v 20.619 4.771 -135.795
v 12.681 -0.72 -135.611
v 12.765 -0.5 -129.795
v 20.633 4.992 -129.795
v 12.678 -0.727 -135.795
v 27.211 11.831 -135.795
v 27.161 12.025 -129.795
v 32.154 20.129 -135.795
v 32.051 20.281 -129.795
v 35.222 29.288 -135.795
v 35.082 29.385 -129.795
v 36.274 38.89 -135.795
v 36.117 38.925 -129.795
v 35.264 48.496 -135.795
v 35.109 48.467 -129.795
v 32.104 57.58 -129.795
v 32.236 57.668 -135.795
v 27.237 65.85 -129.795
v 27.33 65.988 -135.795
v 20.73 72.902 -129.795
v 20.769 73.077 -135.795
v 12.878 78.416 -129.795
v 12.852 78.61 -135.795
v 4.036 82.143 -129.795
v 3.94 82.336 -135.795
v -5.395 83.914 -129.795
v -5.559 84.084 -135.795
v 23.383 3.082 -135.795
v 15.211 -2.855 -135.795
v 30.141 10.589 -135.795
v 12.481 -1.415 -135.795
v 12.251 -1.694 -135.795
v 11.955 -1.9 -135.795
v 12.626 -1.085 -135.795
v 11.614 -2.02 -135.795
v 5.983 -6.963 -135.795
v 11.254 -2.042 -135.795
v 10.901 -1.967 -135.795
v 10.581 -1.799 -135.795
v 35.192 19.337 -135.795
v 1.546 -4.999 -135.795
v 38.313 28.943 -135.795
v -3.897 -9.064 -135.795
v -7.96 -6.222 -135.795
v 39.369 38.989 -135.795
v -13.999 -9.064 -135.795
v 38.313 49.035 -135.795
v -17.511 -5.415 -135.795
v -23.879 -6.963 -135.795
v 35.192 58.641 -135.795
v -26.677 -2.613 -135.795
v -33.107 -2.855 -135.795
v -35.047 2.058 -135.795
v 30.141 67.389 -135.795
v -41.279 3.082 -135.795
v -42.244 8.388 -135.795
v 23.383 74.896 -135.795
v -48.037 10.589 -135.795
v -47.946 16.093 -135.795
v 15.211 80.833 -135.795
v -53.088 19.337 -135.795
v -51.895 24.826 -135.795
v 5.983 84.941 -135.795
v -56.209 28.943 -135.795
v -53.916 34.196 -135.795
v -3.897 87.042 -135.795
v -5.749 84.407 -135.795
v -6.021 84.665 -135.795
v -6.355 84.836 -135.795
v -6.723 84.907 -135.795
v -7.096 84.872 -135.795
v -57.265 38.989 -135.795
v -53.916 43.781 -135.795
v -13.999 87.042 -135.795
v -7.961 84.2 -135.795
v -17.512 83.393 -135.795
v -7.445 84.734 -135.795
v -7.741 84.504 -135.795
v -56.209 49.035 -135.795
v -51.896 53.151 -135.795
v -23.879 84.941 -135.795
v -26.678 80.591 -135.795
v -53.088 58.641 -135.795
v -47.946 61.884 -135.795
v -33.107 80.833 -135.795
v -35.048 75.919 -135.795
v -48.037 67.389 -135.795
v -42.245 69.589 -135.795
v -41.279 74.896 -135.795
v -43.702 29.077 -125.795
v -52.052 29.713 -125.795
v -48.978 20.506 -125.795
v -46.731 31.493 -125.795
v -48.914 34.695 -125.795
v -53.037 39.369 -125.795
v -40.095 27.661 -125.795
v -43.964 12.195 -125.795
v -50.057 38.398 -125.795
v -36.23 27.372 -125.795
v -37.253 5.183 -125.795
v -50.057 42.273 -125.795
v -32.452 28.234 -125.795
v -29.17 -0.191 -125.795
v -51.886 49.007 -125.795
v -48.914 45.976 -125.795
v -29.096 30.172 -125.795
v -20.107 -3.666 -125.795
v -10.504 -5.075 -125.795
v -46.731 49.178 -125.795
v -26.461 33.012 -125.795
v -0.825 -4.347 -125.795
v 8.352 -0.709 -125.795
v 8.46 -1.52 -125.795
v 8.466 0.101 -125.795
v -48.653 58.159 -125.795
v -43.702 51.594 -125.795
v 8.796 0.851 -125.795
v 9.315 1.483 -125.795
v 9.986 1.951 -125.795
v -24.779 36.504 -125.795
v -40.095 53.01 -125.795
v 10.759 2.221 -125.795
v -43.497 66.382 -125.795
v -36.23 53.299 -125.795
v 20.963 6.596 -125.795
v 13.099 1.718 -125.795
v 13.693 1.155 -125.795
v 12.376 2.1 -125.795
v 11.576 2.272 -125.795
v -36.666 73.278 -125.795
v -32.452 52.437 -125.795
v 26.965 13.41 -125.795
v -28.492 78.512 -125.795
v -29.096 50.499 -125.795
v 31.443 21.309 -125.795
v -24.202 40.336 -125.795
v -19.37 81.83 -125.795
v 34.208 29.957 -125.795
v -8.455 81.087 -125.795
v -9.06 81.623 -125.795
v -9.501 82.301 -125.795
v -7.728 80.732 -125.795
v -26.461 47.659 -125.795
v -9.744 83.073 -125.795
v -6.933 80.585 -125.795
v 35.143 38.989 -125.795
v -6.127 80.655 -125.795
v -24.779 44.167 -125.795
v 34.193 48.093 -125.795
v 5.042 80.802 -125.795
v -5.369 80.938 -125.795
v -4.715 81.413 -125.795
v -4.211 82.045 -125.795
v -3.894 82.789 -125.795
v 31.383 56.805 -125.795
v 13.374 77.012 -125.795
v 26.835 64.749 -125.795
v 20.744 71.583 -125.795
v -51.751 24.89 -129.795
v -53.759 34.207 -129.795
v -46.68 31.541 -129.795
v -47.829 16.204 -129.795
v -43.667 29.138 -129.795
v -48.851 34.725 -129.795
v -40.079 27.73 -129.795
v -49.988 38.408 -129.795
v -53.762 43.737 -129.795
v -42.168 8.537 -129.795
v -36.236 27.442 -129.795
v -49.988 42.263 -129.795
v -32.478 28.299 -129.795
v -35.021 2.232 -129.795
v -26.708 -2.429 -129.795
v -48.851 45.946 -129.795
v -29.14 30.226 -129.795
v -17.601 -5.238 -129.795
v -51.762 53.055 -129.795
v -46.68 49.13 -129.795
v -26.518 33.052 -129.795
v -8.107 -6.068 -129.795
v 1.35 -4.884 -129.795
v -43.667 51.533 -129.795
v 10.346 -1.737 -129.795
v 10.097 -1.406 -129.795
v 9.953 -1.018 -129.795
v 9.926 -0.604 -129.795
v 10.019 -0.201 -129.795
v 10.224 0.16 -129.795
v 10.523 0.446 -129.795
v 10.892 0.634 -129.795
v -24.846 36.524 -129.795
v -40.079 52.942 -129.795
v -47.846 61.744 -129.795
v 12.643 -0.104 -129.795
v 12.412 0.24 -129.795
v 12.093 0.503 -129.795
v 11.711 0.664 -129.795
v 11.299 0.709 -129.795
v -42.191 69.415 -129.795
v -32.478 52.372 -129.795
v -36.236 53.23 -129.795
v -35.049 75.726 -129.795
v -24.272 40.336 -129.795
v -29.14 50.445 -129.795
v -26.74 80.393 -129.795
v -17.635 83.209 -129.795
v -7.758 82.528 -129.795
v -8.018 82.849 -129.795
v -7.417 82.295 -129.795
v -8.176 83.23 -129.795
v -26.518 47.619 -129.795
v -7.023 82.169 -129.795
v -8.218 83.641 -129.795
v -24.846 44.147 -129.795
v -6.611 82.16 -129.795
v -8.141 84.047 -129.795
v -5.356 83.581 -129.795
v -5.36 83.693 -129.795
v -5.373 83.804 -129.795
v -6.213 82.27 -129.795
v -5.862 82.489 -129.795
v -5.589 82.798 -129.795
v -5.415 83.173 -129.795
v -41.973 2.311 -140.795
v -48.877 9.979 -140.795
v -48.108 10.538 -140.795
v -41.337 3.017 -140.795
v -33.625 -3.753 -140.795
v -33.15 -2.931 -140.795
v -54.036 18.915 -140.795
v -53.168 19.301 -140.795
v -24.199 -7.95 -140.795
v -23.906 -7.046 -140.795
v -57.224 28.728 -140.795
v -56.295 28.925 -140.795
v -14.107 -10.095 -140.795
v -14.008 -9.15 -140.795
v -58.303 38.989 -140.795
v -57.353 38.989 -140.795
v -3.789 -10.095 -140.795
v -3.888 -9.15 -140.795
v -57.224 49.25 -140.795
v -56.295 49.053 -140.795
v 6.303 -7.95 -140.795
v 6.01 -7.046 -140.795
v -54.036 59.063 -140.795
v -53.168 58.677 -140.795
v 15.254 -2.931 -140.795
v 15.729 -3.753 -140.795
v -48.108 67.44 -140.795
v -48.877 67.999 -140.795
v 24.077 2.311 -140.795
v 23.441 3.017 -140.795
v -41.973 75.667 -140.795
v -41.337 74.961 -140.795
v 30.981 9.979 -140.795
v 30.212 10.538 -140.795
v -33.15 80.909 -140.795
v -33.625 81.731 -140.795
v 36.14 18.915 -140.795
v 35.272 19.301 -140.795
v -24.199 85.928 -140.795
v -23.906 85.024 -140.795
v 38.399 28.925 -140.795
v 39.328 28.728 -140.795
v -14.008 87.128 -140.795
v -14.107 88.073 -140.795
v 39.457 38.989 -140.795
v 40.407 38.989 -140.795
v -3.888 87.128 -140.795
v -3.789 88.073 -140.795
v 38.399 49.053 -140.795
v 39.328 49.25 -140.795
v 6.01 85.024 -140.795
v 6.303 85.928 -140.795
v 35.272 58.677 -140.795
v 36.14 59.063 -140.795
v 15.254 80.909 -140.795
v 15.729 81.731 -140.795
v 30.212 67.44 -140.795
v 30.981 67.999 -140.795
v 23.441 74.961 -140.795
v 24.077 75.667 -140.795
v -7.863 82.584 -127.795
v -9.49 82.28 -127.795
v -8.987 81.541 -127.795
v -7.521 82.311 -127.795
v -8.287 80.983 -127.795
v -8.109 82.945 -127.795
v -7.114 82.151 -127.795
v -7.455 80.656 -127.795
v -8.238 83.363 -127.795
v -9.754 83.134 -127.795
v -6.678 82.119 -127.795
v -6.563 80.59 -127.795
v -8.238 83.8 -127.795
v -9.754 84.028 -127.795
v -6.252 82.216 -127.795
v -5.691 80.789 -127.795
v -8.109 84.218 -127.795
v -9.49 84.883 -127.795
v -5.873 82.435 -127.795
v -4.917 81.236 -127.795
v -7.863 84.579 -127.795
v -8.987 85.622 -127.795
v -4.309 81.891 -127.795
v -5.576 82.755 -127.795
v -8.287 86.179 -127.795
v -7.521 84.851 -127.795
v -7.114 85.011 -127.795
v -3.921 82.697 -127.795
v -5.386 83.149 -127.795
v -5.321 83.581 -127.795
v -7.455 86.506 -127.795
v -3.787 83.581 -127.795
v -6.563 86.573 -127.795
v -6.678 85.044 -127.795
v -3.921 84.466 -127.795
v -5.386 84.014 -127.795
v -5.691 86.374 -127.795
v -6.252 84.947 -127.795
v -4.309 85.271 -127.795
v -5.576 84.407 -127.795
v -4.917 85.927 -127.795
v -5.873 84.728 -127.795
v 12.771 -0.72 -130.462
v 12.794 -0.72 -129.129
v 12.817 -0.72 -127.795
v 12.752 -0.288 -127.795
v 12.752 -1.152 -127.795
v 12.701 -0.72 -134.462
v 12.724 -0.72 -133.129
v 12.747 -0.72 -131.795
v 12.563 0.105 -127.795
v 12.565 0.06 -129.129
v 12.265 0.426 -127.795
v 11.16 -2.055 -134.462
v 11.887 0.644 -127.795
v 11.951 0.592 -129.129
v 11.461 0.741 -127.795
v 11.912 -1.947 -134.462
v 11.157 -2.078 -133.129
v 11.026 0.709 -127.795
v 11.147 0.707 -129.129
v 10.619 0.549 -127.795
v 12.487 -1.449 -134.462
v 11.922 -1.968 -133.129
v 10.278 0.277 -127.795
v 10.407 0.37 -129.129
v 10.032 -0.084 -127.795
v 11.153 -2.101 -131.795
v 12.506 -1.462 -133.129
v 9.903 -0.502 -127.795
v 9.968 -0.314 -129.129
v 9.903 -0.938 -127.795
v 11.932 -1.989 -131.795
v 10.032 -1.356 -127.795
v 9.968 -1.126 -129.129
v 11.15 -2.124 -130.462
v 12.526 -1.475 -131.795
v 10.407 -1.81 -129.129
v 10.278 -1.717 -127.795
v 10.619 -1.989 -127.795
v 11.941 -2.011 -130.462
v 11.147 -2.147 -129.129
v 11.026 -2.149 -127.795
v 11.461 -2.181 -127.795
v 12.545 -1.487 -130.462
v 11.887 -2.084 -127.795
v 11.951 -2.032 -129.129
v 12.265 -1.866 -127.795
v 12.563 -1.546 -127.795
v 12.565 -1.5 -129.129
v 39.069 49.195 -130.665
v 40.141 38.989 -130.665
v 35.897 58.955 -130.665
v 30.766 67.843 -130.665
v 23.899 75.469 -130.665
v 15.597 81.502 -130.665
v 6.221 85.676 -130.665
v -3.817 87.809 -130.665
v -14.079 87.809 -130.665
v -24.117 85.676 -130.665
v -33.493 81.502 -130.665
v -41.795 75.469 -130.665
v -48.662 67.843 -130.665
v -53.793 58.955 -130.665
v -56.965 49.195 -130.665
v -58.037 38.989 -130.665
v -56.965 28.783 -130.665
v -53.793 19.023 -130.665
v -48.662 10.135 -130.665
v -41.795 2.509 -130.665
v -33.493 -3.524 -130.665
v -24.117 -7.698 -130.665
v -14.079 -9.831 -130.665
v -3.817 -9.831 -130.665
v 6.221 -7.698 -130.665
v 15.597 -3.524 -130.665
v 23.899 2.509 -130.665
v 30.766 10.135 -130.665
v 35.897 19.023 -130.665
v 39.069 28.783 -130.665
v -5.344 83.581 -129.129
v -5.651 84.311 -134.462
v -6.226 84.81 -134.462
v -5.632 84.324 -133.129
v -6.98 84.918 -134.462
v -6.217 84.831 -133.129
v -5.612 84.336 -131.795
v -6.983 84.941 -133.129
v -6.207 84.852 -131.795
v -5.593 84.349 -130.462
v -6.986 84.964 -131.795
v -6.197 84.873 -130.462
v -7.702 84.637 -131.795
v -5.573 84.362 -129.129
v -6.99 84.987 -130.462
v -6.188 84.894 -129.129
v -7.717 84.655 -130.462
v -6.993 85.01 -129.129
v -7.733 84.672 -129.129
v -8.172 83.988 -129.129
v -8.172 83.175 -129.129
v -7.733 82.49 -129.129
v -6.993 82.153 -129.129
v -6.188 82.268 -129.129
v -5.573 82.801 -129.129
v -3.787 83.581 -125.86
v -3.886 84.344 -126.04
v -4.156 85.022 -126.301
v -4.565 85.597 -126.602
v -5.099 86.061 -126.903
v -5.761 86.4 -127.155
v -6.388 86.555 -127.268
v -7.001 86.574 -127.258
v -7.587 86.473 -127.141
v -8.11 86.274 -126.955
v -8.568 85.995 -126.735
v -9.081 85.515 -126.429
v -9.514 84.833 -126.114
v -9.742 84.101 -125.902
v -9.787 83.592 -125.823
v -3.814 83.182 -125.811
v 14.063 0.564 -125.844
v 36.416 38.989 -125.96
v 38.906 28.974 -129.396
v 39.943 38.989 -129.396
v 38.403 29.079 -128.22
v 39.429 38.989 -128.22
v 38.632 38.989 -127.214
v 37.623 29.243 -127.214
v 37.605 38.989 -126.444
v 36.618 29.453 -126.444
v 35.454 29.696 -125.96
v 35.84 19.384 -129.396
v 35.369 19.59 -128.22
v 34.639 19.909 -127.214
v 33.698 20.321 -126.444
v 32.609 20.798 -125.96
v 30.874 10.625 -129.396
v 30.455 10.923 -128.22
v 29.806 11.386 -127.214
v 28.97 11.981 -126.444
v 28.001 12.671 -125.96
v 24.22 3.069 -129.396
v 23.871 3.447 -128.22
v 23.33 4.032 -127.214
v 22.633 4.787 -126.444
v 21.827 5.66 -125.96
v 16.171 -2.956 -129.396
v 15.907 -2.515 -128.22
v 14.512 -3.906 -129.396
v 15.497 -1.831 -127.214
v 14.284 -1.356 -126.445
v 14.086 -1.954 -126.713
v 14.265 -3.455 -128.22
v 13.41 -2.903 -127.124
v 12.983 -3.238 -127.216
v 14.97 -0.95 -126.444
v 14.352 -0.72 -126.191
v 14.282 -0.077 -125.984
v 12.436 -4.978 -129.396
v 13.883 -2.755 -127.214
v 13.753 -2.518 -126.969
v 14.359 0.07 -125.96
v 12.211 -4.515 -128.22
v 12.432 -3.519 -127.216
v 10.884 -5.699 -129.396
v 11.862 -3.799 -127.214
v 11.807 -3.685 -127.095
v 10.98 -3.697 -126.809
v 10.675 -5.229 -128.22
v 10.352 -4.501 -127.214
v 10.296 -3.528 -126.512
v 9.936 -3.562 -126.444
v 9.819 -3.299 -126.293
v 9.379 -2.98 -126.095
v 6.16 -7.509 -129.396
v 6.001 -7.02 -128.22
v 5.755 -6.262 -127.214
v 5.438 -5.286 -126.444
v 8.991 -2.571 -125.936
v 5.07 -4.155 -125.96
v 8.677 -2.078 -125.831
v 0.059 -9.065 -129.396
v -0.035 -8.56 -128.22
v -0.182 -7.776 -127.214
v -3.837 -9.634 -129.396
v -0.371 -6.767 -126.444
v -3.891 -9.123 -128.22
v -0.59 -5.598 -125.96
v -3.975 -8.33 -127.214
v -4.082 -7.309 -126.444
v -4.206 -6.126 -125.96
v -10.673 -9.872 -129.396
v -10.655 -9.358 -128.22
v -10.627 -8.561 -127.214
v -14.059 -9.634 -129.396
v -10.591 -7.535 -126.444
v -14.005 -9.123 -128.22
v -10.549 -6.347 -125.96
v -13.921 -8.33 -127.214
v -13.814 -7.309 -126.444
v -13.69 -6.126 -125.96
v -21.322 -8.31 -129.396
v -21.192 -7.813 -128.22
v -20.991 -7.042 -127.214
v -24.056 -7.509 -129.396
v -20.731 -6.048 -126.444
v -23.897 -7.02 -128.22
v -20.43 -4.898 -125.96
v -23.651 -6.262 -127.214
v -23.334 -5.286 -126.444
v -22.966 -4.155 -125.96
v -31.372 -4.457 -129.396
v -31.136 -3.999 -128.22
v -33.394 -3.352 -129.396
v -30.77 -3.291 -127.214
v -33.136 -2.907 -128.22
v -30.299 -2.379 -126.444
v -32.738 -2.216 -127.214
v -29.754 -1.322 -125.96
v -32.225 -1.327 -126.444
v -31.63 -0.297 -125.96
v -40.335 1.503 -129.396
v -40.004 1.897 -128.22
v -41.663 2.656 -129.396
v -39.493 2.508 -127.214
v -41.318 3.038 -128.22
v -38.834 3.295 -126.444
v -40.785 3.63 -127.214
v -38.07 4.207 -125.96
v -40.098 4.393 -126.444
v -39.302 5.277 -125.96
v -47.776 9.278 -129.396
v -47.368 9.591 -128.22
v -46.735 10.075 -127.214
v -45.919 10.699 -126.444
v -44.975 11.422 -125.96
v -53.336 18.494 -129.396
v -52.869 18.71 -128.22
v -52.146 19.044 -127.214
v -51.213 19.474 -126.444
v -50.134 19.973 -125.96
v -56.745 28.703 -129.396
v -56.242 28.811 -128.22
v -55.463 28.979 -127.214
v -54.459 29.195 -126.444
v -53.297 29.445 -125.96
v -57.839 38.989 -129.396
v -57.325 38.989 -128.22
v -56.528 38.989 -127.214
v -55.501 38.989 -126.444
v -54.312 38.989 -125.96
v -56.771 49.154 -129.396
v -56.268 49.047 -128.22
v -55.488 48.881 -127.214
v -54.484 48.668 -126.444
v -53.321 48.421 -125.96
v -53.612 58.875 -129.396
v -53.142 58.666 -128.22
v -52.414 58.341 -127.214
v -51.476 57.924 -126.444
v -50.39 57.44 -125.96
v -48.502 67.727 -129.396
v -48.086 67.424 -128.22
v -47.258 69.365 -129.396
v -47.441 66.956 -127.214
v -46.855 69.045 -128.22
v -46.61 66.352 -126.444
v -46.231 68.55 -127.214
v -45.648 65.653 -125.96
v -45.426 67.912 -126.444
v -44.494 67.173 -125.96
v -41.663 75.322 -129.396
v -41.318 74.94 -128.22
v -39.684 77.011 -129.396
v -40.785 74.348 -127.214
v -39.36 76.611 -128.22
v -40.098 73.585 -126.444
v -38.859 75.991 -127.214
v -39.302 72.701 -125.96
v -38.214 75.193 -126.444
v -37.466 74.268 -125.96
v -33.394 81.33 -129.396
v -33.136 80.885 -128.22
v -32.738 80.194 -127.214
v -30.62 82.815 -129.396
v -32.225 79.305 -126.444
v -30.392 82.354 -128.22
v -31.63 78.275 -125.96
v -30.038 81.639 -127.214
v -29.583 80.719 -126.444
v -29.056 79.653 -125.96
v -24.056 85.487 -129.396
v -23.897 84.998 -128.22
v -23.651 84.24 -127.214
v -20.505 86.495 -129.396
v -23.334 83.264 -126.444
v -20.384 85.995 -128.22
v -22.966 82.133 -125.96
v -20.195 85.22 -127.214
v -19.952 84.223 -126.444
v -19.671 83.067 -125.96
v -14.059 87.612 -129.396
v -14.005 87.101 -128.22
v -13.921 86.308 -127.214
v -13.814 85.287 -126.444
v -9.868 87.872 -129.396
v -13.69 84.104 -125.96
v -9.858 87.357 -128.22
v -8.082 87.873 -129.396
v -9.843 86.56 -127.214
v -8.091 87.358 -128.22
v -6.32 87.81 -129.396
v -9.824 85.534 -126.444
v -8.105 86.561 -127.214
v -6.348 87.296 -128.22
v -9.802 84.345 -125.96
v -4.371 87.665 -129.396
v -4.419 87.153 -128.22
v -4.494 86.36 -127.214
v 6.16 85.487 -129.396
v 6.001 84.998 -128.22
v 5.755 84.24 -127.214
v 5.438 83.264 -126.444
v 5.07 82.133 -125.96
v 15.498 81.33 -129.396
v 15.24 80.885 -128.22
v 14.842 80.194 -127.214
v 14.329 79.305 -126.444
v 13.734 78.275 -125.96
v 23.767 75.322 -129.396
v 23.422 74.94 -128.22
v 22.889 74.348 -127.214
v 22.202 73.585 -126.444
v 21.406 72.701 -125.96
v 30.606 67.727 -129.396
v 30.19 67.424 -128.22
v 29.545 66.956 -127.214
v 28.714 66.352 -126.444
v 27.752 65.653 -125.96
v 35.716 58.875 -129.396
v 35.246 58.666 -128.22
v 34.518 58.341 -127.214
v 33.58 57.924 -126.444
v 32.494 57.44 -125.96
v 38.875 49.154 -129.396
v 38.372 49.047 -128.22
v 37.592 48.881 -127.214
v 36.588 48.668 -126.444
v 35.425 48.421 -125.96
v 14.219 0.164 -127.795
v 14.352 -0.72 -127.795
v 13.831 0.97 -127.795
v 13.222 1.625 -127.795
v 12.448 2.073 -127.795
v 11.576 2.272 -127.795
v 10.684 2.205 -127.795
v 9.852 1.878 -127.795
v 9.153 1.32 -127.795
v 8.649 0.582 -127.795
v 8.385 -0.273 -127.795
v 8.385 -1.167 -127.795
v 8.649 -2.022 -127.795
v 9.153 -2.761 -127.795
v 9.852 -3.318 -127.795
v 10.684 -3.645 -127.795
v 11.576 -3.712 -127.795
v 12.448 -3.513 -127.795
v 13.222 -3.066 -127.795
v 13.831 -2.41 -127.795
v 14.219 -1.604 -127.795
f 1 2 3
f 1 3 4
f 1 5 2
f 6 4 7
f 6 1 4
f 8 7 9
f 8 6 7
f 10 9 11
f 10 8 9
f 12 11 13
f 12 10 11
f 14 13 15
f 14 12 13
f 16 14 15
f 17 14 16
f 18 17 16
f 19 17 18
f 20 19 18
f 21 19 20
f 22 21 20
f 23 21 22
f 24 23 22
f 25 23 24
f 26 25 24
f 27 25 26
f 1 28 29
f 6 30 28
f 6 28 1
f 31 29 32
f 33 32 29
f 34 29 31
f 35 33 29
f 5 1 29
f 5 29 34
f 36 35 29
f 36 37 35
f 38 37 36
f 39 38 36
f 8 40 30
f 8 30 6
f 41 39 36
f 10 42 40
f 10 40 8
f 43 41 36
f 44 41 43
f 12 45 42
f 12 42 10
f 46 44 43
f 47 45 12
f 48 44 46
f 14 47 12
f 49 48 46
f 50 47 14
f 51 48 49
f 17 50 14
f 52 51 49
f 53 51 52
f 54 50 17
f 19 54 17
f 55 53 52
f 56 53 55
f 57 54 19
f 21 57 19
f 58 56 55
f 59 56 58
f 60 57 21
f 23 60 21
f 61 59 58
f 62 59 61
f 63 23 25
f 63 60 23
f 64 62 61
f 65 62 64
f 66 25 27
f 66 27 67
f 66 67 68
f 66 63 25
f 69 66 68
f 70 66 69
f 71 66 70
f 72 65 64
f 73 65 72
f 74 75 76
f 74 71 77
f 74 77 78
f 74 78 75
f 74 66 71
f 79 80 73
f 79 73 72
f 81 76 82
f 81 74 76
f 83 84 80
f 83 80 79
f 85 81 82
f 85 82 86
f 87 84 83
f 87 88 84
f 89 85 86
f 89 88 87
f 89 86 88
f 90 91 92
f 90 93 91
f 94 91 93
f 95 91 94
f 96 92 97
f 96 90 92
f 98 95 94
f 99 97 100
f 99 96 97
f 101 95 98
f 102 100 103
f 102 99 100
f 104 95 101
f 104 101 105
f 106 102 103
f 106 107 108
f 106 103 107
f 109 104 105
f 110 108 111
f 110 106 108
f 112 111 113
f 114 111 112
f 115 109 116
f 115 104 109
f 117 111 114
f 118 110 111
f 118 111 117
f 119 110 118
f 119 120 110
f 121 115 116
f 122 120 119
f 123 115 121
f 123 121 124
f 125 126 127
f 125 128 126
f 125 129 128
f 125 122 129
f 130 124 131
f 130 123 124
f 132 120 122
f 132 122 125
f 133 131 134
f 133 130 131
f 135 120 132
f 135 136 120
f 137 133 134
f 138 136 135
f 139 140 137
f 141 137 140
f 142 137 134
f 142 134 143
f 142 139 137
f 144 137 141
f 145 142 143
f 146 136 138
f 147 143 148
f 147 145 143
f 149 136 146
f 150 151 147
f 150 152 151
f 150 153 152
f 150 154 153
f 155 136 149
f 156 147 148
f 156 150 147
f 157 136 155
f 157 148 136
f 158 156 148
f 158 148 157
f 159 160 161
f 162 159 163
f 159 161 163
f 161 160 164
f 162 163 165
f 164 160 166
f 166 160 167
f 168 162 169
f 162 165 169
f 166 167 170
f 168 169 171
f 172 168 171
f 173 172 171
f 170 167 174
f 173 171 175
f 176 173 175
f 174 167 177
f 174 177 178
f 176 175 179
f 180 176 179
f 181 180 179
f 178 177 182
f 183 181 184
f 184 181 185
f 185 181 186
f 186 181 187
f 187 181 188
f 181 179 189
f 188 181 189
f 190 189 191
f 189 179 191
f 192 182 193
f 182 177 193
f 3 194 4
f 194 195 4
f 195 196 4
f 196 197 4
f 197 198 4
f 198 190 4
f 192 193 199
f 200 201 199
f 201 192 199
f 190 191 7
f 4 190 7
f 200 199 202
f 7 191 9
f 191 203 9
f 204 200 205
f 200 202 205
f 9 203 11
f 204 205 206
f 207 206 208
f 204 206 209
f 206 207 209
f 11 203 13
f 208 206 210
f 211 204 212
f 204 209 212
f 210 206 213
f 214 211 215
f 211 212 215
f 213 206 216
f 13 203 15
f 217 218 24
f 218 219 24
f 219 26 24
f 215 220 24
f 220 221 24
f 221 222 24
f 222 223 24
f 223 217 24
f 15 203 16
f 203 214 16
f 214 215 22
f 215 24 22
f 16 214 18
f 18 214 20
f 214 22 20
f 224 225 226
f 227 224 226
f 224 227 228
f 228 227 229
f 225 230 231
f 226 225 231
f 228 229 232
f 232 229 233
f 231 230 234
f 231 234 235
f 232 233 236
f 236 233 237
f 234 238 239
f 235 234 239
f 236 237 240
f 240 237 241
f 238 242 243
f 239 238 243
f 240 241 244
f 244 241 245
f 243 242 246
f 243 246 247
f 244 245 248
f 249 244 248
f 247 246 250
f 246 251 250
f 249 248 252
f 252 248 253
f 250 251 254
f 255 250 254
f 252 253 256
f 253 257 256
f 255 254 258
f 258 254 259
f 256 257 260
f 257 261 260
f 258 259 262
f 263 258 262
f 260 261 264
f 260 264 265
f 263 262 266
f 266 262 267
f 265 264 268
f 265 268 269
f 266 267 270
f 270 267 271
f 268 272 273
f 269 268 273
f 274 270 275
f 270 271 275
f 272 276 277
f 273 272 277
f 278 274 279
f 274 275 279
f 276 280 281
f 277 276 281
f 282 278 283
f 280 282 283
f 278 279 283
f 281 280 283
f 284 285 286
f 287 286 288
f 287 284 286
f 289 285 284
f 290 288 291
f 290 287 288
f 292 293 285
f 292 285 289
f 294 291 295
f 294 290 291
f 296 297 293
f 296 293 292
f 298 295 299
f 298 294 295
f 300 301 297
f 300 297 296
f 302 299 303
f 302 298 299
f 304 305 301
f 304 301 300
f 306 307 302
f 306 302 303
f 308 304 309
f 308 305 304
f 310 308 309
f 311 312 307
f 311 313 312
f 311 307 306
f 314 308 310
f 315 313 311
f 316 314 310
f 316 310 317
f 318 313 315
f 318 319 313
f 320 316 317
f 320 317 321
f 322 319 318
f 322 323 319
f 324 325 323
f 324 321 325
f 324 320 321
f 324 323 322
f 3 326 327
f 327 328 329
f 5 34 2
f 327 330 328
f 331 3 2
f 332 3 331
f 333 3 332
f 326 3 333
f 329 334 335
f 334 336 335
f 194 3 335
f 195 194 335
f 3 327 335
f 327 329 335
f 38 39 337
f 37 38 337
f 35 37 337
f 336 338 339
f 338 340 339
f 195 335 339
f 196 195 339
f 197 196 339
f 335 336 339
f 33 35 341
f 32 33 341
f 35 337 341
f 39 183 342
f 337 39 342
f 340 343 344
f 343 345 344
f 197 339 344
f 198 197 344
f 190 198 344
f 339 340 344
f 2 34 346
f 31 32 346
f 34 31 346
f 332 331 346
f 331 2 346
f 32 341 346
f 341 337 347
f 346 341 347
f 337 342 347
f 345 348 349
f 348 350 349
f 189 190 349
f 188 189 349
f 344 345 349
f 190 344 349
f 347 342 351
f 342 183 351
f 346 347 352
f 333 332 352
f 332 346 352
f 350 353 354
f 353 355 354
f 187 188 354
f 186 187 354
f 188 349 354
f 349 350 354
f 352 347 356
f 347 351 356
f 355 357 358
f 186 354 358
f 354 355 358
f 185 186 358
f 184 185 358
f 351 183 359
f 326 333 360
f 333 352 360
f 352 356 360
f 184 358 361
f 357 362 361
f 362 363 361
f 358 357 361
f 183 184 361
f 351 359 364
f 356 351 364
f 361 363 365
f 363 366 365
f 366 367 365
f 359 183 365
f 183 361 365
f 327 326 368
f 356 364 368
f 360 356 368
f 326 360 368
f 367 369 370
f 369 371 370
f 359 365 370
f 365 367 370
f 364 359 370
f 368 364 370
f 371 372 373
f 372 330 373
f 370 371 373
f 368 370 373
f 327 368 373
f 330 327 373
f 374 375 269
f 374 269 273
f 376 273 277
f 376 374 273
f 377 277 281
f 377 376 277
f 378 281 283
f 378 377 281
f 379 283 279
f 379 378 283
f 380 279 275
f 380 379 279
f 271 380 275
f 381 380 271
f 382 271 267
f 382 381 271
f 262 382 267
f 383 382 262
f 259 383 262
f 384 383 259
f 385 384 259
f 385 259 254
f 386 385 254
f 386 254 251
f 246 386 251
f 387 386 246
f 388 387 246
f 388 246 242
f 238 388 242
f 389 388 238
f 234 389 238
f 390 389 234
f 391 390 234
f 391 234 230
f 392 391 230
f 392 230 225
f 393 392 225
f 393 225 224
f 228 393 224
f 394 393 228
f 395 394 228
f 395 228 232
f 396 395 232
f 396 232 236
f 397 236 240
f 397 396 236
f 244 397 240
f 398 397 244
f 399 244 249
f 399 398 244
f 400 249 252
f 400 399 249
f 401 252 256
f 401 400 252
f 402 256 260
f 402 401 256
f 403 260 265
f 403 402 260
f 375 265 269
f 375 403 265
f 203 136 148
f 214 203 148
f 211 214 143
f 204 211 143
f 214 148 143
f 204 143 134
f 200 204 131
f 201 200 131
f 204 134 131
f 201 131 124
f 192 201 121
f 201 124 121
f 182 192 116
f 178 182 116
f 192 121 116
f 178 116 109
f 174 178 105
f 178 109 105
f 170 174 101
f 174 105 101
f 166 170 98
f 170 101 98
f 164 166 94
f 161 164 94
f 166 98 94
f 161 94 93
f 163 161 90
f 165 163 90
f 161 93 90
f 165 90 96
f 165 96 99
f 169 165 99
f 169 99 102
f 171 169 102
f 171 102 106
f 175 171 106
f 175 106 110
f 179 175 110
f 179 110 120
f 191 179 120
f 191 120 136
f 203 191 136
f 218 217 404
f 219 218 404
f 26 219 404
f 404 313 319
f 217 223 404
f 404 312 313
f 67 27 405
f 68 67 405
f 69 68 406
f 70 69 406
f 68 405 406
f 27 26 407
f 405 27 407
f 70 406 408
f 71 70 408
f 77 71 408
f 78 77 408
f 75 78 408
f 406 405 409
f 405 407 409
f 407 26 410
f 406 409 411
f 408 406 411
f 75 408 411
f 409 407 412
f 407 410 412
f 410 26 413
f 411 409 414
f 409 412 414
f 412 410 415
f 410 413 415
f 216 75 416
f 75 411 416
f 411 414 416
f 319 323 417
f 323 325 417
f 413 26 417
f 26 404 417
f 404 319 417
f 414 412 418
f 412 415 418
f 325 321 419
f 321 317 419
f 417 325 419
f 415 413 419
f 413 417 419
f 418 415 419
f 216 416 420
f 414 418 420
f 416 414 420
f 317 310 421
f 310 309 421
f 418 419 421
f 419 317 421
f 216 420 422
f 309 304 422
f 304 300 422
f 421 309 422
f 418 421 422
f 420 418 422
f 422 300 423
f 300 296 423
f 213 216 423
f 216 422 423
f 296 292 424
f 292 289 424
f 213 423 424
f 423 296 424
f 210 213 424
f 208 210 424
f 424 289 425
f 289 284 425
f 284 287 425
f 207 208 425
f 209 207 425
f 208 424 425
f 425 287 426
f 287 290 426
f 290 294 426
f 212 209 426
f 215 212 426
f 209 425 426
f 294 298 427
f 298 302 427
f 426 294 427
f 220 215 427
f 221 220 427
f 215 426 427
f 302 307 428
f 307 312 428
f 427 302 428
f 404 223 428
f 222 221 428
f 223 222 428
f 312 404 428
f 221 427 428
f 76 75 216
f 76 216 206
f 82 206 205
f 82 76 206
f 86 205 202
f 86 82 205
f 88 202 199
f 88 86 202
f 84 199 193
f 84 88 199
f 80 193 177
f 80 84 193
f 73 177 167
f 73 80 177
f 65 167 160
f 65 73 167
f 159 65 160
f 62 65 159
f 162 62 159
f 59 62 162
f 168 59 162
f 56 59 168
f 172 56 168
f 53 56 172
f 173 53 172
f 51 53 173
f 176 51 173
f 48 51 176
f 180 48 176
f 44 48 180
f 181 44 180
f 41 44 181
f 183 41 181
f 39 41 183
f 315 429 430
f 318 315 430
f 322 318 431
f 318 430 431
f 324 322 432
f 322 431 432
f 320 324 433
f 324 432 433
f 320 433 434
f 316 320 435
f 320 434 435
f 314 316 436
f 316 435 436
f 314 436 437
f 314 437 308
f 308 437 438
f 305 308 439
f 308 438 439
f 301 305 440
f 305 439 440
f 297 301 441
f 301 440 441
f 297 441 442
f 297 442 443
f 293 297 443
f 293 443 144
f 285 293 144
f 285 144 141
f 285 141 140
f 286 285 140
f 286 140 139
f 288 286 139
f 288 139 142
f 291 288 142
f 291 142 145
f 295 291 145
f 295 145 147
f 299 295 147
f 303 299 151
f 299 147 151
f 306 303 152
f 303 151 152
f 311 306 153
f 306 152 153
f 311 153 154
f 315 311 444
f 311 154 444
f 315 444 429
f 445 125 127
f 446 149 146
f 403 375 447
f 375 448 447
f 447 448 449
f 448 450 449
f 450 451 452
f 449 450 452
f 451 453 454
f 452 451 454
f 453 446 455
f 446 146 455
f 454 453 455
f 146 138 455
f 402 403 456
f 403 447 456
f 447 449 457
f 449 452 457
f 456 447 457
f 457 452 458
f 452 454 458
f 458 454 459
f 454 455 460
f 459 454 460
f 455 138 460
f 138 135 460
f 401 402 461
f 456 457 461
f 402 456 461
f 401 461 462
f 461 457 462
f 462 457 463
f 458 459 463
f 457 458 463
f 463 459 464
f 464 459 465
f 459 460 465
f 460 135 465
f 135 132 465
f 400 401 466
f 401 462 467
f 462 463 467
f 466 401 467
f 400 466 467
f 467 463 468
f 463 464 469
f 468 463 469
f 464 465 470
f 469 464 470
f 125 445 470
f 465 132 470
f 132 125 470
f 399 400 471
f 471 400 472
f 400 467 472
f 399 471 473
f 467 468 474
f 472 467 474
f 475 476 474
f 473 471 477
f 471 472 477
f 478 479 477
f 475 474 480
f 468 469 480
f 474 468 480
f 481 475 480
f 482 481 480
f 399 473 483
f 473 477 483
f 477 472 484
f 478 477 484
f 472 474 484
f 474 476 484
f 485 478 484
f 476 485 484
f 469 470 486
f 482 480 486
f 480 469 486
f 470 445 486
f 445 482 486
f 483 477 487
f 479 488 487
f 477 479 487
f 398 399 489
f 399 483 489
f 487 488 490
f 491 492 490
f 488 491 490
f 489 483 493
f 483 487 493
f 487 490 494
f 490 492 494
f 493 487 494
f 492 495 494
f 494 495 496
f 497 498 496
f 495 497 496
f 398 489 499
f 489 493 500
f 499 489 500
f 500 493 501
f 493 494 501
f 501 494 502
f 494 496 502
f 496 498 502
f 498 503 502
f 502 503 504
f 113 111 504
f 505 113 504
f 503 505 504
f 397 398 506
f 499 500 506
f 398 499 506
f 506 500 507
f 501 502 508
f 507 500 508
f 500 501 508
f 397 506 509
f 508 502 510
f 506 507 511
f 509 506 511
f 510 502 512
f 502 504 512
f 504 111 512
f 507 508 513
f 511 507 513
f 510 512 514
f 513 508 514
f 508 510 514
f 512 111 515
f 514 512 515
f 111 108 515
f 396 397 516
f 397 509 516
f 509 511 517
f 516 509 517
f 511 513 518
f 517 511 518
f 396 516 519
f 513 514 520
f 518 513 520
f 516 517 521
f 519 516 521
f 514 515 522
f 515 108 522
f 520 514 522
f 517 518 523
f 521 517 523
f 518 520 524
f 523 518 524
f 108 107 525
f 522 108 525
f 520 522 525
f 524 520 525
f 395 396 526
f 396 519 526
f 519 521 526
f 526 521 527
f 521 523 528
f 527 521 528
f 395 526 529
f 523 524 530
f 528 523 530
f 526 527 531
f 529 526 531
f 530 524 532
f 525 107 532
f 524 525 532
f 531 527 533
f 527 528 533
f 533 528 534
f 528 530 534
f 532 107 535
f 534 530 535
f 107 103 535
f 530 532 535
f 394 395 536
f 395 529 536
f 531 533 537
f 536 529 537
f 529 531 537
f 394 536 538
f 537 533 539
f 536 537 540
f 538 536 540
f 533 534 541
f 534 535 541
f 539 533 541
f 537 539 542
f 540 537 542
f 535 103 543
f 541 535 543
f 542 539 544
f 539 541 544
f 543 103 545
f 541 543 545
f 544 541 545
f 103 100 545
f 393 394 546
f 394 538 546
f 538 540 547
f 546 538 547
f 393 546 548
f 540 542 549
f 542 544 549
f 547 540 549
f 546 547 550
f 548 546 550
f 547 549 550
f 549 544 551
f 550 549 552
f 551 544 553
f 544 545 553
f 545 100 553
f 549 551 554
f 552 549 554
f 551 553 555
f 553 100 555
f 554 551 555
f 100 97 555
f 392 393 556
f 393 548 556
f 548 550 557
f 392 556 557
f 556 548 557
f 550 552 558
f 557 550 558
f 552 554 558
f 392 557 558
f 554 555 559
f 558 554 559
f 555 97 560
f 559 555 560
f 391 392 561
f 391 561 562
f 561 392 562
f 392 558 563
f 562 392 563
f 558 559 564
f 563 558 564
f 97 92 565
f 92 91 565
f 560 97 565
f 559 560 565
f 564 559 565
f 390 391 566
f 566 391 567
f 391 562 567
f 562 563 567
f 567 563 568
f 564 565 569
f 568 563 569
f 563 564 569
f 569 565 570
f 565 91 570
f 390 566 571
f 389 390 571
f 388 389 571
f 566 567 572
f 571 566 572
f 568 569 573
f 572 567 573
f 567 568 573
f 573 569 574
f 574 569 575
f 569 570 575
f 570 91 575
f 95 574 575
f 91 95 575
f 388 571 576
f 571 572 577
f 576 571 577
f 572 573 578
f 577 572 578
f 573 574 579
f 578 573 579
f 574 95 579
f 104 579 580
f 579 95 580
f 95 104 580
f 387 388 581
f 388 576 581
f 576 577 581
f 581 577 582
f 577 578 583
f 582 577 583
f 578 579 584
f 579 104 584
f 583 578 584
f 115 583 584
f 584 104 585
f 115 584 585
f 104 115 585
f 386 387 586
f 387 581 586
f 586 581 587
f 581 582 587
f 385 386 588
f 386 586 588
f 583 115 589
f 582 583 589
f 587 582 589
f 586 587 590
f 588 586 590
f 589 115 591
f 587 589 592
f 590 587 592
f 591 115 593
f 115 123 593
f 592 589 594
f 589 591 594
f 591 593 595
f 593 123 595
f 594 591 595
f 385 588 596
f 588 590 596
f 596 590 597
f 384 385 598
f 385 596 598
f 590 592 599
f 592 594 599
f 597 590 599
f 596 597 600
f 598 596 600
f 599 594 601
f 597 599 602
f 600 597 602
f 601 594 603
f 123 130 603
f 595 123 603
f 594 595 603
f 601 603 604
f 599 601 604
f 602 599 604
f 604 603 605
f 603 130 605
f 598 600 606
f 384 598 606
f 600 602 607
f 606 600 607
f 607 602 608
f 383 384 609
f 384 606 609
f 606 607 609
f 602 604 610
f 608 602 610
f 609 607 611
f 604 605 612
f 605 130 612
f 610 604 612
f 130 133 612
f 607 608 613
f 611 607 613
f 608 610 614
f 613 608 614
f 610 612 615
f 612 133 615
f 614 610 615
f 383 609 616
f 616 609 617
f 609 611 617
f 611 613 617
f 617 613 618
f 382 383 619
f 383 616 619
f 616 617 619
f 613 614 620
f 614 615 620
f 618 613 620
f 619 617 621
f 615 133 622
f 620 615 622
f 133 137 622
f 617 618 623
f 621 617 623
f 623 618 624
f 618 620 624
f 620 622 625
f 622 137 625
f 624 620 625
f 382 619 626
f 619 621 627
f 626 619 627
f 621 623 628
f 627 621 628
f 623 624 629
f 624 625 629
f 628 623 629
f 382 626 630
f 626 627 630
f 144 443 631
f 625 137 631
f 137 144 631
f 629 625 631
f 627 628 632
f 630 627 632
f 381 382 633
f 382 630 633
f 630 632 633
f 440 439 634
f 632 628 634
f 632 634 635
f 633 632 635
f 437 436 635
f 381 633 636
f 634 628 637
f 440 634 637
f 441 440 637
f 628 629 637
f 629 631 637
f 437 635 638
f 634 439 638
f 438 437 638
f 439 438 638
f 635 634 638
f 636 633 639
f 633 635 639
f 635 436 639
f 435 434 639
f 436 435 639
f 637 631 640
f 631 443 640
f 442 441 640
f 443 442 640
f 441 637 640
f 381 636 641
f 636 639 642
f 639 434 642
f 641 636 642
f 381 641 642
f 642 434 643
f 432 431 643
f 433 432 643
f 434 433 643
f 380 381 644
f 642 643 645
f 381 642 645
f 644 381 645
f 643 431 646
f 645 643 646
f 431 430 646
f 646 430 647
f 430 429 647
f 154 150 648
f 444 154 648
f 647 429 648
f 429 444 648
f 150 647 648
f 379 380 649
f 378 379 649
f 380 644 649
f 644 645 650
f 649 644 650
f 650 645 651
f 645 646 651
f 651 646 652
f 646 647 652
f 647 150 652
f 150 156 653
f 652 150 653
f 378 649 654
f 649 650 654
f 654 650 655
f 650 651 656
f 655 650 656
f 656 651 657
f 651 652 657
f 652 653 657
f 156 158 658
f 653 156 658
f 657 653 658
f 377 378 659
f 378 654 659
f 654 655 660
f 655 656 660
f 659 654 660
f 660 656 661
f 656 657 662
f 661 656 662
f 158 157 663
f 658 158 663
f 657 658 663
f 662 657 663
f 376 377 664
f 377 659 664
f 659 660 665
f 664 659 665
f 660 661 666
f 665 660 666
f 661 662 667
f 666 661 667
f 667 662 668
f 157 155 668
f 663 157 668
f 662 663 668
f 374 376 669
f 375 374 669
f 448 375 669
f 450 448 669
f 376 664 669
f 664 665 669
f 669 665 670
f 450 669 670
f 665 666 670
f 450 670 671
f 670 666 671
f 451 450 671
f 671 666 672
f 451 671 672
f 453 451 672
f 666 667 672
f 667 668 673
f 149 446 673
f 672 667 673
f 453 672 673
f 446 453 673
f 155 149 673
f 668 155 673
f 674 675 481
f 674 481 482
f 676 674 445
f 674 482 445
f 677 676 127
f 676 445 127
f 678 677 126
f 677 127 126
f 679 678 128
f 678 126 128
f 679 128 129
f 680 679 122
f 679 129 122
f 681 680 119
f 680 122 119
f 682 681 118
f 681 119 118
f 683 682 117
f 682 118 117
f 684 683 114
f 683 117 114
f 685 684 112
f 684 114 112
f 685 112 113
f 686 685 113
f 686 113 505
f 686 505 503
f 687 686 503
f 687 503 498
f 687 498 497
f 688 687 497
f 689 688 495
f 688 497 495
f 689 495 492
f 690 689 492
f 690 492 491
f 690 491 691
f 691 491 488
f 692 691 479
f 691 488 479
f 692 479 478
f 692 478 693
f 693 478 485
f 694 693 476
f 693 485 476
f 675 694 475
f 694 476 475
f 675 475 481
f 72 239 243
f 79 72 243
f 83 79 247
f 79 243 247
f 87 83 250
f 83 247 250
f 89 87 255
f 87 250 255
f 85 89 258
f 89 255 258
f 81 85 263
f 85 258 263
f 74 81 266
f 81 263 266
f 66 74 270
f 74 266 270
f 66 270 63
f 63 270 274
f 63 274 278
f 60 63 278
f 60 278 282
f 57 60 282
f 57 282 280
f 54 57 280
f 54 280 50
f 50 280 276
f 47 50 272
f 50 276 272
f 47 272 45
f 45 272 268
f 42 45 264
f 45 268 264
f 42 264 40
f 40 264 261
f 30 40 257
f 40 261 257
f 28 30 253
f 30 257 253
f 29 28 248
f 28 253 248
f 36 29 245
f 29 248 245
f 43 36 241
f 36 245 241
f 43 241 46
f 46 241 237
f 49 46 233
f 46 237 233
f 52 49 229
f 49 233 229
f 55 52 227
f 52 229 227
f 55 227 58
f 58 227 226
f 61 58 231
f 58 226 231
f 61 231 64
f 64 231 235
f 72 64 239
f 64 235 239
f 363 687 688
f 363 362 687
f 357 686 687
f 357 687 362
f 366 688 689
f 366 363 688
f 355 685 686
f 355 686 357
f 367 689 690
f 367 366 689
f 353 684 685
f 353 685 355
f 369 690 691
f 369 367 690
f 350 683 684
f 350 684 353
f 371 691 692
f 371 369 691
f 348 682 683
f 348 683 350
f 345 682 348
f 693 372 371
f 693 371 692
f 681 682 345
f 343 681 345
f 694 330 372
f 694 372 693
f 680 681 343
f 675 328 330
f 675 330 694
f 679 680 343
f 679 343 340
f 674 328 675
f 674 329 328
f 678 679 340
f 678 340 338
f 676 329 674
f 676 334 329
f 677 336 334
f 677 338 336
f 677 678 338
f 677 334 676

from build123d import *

# Parameters (mm, degrees)
SKETCH2_R                     = 49.197422353
BOSS_EXTRUDE1_DEPTH           = 9
BOSS_EXTRUDE1_TAPER           = 1.5
BOSS_EXTRUDE1_OTHER_WAY_DEPTH = 6
BOSS_EXTRUDE1_OTHER_WAY_TAPER = -1.5
SHELL1_T                      = -4
FILLET1_R                     = 5
SKETCH6_R                     = 13
WIREHOLES_DEPTH               = 10
WIREHOLES_DRAFT               = -1
SKETCH7_R                     = 48.404537882
INSIDELAYER_DEPTH             = 5
INSIDELAYER_DRAFT             = -1
SKETCH8_R                     = 1.500272091
NAIL_DEPTH                    = 10
NAIL_DRAFT                    = -1
SKETCH8_R_2                   = 1.501577836
NAIL_PROFILE_2_DEPTH          = 10
NAIL_PROFILE_2_DRAFT          = -1
SKETCH9_R                     = 3
NAILHEAD_DEPTH                = 2


with BuildPart() as part:
    # Sketch2 → Boss-Extrude1 (new body)
    with BuildSketch(Plane.XY.offset(-134.795498858)):
        with Locations((-8.948, 38.989)):
            Circle(SKETCH2_R)
    extrude(amount=BOSS_EXTRUDE1_DEPTH, taper=BOSS_EXTRUDE1_TAPER)

    # Sketch2 → Boss-Extrude1 other way (add)
    with BuildSketch(Plane.XY.offset(-134.795498858)):
        with Locations((-8.948, 38.989)):
            Circle(SKETCH2_R)
    extrude(amount=-BOSS_EXTRUDE1_OTHER_WAY_DEPTH, taper=BOSS_EXTRUDE1_OTHER_WAY_TAPER)

    # Shell1
    shell1_openings = [part.faces().sort_by_distance(p)[0] for p in [
        (-8.948, 38.989, -140.795498858),
    ]]
    offset(amount=SHELL1_T, openings=shell1_openings, kind=Kind.INTERSECTION)

    # Fillet1
    fillet1_edges = [part.edges().sort_by_distance(p)[0] for p in [
        (-57.909749059, 38.989, -125.795498858),
    ]]
    fillet(fillet1_edges, radius=FILLET1_R)


with BuildPart() as wireholes_tool:
    # Sketch6 → wireHoles (with draft: the straight prism first)
    with BuildSketch(Plane.XY.offset(-125.795498858)):
        with Locations((-37.201803, 40.335557149)):
            Circle(SKETCH6_R)
    extrude(amount=-WIREHOLES_DEPTH)
    # wireHoles: the draft: its side faces are tilted about the plane it starts from
    wireholes_sides = [wireholes_tool.faces().sort_by_distance(p)[0] for p in [
        (-50.201803, 40.335557149, -130.795498858),
    ]]
    draft(wireholes_sides, Plane.XY.offset(-125.795498858), WIREHOLES_DRAFT)


with BuildPart() as part_1:
    add(part.part)

    # wireHoles: cut by wireholes_tool
    add(wireholes_tool.part, mode=Mode.SUBTRACT)


with BuildPart() as insidelayer_tool:
    # Sketch7 → insideLayer (with draft: the straight prism first)
    with BuildSketch(Plane(origin=(0, 0, -140.795498858), x_dir=(-1, 0, 0), z_dir=(0, 0, -1))):
        with Locations((8.948, 38.989)):
            Circle(SKETCH7_R)
    extrude(amount=-INSIDELAYER_DEPTH)
    # insideLayer: the draft: its side faces are tilted about the plane it starts from
    insidelayer_sides = [insidelayer_tool.faces().sort_by_distance(p)[0] for p in [
        (39.456537882, 38.989, -138.295498858),
    ]]
    draft(insidelayer_sides, Plane(origin=(0, 0, -140.795498858), x_dir=(-1, 0, 0), z_dir=(0, 0, -1)), INSIDELAYER_DRAFT)


with BuildPart() as part_2:
    add(part_1.part)

    # insideLayer: cut by insidelayer_tool
    add(insidelayer_tool.part, mode=Mode.SUBTRACT)


with BuildPart() as nail_tool:
    # Sketch8 → nail (with draft: the straight prism first)
    with BuildSketch(Plane.XY.offset(-125.795498858)):
        with Locations((11.351812063, -0.720065293)):
            Circle(SKETCH8_R)
    extrude(amount=-NAIL_DEPTH)
    # nail: the draft: its side faces are tilted about the plane it starts from
    nail_sides = [nail_tool.faces().sort_by_distance(p)[0] for p in [
        (9.851539971, -0.720065293, -130.795498858),
    ]]
    draft(nail_sides, Plane.XY.offset(-125.795498858), NAIL_DRAFT)


with BuildPart() as part_3:
    add(part_2.part)

    # nail: cut by nail_tool
    add(nail_tool.part, mode=Mode.SUBTRACT)


with BuildPart() as nail_profile_2_tool:
    # Sketch8 → nail profile 2 (with draft: the straight prism first)
    with BuildSketch(Plane.XY.offset(-125.795498858)):
        with Locations((-6.787419008, 83.581267699)):
            Circle(SKETCH8_R_2)
    extrude(amount=-NAIL_PROFILE_2_DEPTH)
    # nail profile 2: the draft: its side faces are tilted about the plane it starts from
    nail_profile_2_sides = [nail_profile_2_tool.faces().sort_by_distance(p)[0] for p in [
        (-8.288996843, 83.581267699, -130.795498858),
    ]]
    draft(nail_profile_2_sides, Plane.XY.offset(-125.795498858), NAIL_PROFILE_2_DRAFT)


with BuildPart() as part_4:
    add(part_3.part)

    # nail profile 2: cut by nail_profile_2_tool
    add(nail_profile_2_tool.part, mode=Mode.SUBTRACT)

    # Sketch9 → nailHead (cut)
    with BuildSketch(Plane.XY.offset(-125.795498858)):
        with Locations((-6.787419008, 83.581267699)):
            Circle(SKETCH9_R)
        with Locations((11.351812063, -0.720065293)):
            Circle(SKETCH9_R)
    extrude(amount=-NAILHEAD_DEPTH, mode=Mode.SUBTRACT)


solid = part_4.part
